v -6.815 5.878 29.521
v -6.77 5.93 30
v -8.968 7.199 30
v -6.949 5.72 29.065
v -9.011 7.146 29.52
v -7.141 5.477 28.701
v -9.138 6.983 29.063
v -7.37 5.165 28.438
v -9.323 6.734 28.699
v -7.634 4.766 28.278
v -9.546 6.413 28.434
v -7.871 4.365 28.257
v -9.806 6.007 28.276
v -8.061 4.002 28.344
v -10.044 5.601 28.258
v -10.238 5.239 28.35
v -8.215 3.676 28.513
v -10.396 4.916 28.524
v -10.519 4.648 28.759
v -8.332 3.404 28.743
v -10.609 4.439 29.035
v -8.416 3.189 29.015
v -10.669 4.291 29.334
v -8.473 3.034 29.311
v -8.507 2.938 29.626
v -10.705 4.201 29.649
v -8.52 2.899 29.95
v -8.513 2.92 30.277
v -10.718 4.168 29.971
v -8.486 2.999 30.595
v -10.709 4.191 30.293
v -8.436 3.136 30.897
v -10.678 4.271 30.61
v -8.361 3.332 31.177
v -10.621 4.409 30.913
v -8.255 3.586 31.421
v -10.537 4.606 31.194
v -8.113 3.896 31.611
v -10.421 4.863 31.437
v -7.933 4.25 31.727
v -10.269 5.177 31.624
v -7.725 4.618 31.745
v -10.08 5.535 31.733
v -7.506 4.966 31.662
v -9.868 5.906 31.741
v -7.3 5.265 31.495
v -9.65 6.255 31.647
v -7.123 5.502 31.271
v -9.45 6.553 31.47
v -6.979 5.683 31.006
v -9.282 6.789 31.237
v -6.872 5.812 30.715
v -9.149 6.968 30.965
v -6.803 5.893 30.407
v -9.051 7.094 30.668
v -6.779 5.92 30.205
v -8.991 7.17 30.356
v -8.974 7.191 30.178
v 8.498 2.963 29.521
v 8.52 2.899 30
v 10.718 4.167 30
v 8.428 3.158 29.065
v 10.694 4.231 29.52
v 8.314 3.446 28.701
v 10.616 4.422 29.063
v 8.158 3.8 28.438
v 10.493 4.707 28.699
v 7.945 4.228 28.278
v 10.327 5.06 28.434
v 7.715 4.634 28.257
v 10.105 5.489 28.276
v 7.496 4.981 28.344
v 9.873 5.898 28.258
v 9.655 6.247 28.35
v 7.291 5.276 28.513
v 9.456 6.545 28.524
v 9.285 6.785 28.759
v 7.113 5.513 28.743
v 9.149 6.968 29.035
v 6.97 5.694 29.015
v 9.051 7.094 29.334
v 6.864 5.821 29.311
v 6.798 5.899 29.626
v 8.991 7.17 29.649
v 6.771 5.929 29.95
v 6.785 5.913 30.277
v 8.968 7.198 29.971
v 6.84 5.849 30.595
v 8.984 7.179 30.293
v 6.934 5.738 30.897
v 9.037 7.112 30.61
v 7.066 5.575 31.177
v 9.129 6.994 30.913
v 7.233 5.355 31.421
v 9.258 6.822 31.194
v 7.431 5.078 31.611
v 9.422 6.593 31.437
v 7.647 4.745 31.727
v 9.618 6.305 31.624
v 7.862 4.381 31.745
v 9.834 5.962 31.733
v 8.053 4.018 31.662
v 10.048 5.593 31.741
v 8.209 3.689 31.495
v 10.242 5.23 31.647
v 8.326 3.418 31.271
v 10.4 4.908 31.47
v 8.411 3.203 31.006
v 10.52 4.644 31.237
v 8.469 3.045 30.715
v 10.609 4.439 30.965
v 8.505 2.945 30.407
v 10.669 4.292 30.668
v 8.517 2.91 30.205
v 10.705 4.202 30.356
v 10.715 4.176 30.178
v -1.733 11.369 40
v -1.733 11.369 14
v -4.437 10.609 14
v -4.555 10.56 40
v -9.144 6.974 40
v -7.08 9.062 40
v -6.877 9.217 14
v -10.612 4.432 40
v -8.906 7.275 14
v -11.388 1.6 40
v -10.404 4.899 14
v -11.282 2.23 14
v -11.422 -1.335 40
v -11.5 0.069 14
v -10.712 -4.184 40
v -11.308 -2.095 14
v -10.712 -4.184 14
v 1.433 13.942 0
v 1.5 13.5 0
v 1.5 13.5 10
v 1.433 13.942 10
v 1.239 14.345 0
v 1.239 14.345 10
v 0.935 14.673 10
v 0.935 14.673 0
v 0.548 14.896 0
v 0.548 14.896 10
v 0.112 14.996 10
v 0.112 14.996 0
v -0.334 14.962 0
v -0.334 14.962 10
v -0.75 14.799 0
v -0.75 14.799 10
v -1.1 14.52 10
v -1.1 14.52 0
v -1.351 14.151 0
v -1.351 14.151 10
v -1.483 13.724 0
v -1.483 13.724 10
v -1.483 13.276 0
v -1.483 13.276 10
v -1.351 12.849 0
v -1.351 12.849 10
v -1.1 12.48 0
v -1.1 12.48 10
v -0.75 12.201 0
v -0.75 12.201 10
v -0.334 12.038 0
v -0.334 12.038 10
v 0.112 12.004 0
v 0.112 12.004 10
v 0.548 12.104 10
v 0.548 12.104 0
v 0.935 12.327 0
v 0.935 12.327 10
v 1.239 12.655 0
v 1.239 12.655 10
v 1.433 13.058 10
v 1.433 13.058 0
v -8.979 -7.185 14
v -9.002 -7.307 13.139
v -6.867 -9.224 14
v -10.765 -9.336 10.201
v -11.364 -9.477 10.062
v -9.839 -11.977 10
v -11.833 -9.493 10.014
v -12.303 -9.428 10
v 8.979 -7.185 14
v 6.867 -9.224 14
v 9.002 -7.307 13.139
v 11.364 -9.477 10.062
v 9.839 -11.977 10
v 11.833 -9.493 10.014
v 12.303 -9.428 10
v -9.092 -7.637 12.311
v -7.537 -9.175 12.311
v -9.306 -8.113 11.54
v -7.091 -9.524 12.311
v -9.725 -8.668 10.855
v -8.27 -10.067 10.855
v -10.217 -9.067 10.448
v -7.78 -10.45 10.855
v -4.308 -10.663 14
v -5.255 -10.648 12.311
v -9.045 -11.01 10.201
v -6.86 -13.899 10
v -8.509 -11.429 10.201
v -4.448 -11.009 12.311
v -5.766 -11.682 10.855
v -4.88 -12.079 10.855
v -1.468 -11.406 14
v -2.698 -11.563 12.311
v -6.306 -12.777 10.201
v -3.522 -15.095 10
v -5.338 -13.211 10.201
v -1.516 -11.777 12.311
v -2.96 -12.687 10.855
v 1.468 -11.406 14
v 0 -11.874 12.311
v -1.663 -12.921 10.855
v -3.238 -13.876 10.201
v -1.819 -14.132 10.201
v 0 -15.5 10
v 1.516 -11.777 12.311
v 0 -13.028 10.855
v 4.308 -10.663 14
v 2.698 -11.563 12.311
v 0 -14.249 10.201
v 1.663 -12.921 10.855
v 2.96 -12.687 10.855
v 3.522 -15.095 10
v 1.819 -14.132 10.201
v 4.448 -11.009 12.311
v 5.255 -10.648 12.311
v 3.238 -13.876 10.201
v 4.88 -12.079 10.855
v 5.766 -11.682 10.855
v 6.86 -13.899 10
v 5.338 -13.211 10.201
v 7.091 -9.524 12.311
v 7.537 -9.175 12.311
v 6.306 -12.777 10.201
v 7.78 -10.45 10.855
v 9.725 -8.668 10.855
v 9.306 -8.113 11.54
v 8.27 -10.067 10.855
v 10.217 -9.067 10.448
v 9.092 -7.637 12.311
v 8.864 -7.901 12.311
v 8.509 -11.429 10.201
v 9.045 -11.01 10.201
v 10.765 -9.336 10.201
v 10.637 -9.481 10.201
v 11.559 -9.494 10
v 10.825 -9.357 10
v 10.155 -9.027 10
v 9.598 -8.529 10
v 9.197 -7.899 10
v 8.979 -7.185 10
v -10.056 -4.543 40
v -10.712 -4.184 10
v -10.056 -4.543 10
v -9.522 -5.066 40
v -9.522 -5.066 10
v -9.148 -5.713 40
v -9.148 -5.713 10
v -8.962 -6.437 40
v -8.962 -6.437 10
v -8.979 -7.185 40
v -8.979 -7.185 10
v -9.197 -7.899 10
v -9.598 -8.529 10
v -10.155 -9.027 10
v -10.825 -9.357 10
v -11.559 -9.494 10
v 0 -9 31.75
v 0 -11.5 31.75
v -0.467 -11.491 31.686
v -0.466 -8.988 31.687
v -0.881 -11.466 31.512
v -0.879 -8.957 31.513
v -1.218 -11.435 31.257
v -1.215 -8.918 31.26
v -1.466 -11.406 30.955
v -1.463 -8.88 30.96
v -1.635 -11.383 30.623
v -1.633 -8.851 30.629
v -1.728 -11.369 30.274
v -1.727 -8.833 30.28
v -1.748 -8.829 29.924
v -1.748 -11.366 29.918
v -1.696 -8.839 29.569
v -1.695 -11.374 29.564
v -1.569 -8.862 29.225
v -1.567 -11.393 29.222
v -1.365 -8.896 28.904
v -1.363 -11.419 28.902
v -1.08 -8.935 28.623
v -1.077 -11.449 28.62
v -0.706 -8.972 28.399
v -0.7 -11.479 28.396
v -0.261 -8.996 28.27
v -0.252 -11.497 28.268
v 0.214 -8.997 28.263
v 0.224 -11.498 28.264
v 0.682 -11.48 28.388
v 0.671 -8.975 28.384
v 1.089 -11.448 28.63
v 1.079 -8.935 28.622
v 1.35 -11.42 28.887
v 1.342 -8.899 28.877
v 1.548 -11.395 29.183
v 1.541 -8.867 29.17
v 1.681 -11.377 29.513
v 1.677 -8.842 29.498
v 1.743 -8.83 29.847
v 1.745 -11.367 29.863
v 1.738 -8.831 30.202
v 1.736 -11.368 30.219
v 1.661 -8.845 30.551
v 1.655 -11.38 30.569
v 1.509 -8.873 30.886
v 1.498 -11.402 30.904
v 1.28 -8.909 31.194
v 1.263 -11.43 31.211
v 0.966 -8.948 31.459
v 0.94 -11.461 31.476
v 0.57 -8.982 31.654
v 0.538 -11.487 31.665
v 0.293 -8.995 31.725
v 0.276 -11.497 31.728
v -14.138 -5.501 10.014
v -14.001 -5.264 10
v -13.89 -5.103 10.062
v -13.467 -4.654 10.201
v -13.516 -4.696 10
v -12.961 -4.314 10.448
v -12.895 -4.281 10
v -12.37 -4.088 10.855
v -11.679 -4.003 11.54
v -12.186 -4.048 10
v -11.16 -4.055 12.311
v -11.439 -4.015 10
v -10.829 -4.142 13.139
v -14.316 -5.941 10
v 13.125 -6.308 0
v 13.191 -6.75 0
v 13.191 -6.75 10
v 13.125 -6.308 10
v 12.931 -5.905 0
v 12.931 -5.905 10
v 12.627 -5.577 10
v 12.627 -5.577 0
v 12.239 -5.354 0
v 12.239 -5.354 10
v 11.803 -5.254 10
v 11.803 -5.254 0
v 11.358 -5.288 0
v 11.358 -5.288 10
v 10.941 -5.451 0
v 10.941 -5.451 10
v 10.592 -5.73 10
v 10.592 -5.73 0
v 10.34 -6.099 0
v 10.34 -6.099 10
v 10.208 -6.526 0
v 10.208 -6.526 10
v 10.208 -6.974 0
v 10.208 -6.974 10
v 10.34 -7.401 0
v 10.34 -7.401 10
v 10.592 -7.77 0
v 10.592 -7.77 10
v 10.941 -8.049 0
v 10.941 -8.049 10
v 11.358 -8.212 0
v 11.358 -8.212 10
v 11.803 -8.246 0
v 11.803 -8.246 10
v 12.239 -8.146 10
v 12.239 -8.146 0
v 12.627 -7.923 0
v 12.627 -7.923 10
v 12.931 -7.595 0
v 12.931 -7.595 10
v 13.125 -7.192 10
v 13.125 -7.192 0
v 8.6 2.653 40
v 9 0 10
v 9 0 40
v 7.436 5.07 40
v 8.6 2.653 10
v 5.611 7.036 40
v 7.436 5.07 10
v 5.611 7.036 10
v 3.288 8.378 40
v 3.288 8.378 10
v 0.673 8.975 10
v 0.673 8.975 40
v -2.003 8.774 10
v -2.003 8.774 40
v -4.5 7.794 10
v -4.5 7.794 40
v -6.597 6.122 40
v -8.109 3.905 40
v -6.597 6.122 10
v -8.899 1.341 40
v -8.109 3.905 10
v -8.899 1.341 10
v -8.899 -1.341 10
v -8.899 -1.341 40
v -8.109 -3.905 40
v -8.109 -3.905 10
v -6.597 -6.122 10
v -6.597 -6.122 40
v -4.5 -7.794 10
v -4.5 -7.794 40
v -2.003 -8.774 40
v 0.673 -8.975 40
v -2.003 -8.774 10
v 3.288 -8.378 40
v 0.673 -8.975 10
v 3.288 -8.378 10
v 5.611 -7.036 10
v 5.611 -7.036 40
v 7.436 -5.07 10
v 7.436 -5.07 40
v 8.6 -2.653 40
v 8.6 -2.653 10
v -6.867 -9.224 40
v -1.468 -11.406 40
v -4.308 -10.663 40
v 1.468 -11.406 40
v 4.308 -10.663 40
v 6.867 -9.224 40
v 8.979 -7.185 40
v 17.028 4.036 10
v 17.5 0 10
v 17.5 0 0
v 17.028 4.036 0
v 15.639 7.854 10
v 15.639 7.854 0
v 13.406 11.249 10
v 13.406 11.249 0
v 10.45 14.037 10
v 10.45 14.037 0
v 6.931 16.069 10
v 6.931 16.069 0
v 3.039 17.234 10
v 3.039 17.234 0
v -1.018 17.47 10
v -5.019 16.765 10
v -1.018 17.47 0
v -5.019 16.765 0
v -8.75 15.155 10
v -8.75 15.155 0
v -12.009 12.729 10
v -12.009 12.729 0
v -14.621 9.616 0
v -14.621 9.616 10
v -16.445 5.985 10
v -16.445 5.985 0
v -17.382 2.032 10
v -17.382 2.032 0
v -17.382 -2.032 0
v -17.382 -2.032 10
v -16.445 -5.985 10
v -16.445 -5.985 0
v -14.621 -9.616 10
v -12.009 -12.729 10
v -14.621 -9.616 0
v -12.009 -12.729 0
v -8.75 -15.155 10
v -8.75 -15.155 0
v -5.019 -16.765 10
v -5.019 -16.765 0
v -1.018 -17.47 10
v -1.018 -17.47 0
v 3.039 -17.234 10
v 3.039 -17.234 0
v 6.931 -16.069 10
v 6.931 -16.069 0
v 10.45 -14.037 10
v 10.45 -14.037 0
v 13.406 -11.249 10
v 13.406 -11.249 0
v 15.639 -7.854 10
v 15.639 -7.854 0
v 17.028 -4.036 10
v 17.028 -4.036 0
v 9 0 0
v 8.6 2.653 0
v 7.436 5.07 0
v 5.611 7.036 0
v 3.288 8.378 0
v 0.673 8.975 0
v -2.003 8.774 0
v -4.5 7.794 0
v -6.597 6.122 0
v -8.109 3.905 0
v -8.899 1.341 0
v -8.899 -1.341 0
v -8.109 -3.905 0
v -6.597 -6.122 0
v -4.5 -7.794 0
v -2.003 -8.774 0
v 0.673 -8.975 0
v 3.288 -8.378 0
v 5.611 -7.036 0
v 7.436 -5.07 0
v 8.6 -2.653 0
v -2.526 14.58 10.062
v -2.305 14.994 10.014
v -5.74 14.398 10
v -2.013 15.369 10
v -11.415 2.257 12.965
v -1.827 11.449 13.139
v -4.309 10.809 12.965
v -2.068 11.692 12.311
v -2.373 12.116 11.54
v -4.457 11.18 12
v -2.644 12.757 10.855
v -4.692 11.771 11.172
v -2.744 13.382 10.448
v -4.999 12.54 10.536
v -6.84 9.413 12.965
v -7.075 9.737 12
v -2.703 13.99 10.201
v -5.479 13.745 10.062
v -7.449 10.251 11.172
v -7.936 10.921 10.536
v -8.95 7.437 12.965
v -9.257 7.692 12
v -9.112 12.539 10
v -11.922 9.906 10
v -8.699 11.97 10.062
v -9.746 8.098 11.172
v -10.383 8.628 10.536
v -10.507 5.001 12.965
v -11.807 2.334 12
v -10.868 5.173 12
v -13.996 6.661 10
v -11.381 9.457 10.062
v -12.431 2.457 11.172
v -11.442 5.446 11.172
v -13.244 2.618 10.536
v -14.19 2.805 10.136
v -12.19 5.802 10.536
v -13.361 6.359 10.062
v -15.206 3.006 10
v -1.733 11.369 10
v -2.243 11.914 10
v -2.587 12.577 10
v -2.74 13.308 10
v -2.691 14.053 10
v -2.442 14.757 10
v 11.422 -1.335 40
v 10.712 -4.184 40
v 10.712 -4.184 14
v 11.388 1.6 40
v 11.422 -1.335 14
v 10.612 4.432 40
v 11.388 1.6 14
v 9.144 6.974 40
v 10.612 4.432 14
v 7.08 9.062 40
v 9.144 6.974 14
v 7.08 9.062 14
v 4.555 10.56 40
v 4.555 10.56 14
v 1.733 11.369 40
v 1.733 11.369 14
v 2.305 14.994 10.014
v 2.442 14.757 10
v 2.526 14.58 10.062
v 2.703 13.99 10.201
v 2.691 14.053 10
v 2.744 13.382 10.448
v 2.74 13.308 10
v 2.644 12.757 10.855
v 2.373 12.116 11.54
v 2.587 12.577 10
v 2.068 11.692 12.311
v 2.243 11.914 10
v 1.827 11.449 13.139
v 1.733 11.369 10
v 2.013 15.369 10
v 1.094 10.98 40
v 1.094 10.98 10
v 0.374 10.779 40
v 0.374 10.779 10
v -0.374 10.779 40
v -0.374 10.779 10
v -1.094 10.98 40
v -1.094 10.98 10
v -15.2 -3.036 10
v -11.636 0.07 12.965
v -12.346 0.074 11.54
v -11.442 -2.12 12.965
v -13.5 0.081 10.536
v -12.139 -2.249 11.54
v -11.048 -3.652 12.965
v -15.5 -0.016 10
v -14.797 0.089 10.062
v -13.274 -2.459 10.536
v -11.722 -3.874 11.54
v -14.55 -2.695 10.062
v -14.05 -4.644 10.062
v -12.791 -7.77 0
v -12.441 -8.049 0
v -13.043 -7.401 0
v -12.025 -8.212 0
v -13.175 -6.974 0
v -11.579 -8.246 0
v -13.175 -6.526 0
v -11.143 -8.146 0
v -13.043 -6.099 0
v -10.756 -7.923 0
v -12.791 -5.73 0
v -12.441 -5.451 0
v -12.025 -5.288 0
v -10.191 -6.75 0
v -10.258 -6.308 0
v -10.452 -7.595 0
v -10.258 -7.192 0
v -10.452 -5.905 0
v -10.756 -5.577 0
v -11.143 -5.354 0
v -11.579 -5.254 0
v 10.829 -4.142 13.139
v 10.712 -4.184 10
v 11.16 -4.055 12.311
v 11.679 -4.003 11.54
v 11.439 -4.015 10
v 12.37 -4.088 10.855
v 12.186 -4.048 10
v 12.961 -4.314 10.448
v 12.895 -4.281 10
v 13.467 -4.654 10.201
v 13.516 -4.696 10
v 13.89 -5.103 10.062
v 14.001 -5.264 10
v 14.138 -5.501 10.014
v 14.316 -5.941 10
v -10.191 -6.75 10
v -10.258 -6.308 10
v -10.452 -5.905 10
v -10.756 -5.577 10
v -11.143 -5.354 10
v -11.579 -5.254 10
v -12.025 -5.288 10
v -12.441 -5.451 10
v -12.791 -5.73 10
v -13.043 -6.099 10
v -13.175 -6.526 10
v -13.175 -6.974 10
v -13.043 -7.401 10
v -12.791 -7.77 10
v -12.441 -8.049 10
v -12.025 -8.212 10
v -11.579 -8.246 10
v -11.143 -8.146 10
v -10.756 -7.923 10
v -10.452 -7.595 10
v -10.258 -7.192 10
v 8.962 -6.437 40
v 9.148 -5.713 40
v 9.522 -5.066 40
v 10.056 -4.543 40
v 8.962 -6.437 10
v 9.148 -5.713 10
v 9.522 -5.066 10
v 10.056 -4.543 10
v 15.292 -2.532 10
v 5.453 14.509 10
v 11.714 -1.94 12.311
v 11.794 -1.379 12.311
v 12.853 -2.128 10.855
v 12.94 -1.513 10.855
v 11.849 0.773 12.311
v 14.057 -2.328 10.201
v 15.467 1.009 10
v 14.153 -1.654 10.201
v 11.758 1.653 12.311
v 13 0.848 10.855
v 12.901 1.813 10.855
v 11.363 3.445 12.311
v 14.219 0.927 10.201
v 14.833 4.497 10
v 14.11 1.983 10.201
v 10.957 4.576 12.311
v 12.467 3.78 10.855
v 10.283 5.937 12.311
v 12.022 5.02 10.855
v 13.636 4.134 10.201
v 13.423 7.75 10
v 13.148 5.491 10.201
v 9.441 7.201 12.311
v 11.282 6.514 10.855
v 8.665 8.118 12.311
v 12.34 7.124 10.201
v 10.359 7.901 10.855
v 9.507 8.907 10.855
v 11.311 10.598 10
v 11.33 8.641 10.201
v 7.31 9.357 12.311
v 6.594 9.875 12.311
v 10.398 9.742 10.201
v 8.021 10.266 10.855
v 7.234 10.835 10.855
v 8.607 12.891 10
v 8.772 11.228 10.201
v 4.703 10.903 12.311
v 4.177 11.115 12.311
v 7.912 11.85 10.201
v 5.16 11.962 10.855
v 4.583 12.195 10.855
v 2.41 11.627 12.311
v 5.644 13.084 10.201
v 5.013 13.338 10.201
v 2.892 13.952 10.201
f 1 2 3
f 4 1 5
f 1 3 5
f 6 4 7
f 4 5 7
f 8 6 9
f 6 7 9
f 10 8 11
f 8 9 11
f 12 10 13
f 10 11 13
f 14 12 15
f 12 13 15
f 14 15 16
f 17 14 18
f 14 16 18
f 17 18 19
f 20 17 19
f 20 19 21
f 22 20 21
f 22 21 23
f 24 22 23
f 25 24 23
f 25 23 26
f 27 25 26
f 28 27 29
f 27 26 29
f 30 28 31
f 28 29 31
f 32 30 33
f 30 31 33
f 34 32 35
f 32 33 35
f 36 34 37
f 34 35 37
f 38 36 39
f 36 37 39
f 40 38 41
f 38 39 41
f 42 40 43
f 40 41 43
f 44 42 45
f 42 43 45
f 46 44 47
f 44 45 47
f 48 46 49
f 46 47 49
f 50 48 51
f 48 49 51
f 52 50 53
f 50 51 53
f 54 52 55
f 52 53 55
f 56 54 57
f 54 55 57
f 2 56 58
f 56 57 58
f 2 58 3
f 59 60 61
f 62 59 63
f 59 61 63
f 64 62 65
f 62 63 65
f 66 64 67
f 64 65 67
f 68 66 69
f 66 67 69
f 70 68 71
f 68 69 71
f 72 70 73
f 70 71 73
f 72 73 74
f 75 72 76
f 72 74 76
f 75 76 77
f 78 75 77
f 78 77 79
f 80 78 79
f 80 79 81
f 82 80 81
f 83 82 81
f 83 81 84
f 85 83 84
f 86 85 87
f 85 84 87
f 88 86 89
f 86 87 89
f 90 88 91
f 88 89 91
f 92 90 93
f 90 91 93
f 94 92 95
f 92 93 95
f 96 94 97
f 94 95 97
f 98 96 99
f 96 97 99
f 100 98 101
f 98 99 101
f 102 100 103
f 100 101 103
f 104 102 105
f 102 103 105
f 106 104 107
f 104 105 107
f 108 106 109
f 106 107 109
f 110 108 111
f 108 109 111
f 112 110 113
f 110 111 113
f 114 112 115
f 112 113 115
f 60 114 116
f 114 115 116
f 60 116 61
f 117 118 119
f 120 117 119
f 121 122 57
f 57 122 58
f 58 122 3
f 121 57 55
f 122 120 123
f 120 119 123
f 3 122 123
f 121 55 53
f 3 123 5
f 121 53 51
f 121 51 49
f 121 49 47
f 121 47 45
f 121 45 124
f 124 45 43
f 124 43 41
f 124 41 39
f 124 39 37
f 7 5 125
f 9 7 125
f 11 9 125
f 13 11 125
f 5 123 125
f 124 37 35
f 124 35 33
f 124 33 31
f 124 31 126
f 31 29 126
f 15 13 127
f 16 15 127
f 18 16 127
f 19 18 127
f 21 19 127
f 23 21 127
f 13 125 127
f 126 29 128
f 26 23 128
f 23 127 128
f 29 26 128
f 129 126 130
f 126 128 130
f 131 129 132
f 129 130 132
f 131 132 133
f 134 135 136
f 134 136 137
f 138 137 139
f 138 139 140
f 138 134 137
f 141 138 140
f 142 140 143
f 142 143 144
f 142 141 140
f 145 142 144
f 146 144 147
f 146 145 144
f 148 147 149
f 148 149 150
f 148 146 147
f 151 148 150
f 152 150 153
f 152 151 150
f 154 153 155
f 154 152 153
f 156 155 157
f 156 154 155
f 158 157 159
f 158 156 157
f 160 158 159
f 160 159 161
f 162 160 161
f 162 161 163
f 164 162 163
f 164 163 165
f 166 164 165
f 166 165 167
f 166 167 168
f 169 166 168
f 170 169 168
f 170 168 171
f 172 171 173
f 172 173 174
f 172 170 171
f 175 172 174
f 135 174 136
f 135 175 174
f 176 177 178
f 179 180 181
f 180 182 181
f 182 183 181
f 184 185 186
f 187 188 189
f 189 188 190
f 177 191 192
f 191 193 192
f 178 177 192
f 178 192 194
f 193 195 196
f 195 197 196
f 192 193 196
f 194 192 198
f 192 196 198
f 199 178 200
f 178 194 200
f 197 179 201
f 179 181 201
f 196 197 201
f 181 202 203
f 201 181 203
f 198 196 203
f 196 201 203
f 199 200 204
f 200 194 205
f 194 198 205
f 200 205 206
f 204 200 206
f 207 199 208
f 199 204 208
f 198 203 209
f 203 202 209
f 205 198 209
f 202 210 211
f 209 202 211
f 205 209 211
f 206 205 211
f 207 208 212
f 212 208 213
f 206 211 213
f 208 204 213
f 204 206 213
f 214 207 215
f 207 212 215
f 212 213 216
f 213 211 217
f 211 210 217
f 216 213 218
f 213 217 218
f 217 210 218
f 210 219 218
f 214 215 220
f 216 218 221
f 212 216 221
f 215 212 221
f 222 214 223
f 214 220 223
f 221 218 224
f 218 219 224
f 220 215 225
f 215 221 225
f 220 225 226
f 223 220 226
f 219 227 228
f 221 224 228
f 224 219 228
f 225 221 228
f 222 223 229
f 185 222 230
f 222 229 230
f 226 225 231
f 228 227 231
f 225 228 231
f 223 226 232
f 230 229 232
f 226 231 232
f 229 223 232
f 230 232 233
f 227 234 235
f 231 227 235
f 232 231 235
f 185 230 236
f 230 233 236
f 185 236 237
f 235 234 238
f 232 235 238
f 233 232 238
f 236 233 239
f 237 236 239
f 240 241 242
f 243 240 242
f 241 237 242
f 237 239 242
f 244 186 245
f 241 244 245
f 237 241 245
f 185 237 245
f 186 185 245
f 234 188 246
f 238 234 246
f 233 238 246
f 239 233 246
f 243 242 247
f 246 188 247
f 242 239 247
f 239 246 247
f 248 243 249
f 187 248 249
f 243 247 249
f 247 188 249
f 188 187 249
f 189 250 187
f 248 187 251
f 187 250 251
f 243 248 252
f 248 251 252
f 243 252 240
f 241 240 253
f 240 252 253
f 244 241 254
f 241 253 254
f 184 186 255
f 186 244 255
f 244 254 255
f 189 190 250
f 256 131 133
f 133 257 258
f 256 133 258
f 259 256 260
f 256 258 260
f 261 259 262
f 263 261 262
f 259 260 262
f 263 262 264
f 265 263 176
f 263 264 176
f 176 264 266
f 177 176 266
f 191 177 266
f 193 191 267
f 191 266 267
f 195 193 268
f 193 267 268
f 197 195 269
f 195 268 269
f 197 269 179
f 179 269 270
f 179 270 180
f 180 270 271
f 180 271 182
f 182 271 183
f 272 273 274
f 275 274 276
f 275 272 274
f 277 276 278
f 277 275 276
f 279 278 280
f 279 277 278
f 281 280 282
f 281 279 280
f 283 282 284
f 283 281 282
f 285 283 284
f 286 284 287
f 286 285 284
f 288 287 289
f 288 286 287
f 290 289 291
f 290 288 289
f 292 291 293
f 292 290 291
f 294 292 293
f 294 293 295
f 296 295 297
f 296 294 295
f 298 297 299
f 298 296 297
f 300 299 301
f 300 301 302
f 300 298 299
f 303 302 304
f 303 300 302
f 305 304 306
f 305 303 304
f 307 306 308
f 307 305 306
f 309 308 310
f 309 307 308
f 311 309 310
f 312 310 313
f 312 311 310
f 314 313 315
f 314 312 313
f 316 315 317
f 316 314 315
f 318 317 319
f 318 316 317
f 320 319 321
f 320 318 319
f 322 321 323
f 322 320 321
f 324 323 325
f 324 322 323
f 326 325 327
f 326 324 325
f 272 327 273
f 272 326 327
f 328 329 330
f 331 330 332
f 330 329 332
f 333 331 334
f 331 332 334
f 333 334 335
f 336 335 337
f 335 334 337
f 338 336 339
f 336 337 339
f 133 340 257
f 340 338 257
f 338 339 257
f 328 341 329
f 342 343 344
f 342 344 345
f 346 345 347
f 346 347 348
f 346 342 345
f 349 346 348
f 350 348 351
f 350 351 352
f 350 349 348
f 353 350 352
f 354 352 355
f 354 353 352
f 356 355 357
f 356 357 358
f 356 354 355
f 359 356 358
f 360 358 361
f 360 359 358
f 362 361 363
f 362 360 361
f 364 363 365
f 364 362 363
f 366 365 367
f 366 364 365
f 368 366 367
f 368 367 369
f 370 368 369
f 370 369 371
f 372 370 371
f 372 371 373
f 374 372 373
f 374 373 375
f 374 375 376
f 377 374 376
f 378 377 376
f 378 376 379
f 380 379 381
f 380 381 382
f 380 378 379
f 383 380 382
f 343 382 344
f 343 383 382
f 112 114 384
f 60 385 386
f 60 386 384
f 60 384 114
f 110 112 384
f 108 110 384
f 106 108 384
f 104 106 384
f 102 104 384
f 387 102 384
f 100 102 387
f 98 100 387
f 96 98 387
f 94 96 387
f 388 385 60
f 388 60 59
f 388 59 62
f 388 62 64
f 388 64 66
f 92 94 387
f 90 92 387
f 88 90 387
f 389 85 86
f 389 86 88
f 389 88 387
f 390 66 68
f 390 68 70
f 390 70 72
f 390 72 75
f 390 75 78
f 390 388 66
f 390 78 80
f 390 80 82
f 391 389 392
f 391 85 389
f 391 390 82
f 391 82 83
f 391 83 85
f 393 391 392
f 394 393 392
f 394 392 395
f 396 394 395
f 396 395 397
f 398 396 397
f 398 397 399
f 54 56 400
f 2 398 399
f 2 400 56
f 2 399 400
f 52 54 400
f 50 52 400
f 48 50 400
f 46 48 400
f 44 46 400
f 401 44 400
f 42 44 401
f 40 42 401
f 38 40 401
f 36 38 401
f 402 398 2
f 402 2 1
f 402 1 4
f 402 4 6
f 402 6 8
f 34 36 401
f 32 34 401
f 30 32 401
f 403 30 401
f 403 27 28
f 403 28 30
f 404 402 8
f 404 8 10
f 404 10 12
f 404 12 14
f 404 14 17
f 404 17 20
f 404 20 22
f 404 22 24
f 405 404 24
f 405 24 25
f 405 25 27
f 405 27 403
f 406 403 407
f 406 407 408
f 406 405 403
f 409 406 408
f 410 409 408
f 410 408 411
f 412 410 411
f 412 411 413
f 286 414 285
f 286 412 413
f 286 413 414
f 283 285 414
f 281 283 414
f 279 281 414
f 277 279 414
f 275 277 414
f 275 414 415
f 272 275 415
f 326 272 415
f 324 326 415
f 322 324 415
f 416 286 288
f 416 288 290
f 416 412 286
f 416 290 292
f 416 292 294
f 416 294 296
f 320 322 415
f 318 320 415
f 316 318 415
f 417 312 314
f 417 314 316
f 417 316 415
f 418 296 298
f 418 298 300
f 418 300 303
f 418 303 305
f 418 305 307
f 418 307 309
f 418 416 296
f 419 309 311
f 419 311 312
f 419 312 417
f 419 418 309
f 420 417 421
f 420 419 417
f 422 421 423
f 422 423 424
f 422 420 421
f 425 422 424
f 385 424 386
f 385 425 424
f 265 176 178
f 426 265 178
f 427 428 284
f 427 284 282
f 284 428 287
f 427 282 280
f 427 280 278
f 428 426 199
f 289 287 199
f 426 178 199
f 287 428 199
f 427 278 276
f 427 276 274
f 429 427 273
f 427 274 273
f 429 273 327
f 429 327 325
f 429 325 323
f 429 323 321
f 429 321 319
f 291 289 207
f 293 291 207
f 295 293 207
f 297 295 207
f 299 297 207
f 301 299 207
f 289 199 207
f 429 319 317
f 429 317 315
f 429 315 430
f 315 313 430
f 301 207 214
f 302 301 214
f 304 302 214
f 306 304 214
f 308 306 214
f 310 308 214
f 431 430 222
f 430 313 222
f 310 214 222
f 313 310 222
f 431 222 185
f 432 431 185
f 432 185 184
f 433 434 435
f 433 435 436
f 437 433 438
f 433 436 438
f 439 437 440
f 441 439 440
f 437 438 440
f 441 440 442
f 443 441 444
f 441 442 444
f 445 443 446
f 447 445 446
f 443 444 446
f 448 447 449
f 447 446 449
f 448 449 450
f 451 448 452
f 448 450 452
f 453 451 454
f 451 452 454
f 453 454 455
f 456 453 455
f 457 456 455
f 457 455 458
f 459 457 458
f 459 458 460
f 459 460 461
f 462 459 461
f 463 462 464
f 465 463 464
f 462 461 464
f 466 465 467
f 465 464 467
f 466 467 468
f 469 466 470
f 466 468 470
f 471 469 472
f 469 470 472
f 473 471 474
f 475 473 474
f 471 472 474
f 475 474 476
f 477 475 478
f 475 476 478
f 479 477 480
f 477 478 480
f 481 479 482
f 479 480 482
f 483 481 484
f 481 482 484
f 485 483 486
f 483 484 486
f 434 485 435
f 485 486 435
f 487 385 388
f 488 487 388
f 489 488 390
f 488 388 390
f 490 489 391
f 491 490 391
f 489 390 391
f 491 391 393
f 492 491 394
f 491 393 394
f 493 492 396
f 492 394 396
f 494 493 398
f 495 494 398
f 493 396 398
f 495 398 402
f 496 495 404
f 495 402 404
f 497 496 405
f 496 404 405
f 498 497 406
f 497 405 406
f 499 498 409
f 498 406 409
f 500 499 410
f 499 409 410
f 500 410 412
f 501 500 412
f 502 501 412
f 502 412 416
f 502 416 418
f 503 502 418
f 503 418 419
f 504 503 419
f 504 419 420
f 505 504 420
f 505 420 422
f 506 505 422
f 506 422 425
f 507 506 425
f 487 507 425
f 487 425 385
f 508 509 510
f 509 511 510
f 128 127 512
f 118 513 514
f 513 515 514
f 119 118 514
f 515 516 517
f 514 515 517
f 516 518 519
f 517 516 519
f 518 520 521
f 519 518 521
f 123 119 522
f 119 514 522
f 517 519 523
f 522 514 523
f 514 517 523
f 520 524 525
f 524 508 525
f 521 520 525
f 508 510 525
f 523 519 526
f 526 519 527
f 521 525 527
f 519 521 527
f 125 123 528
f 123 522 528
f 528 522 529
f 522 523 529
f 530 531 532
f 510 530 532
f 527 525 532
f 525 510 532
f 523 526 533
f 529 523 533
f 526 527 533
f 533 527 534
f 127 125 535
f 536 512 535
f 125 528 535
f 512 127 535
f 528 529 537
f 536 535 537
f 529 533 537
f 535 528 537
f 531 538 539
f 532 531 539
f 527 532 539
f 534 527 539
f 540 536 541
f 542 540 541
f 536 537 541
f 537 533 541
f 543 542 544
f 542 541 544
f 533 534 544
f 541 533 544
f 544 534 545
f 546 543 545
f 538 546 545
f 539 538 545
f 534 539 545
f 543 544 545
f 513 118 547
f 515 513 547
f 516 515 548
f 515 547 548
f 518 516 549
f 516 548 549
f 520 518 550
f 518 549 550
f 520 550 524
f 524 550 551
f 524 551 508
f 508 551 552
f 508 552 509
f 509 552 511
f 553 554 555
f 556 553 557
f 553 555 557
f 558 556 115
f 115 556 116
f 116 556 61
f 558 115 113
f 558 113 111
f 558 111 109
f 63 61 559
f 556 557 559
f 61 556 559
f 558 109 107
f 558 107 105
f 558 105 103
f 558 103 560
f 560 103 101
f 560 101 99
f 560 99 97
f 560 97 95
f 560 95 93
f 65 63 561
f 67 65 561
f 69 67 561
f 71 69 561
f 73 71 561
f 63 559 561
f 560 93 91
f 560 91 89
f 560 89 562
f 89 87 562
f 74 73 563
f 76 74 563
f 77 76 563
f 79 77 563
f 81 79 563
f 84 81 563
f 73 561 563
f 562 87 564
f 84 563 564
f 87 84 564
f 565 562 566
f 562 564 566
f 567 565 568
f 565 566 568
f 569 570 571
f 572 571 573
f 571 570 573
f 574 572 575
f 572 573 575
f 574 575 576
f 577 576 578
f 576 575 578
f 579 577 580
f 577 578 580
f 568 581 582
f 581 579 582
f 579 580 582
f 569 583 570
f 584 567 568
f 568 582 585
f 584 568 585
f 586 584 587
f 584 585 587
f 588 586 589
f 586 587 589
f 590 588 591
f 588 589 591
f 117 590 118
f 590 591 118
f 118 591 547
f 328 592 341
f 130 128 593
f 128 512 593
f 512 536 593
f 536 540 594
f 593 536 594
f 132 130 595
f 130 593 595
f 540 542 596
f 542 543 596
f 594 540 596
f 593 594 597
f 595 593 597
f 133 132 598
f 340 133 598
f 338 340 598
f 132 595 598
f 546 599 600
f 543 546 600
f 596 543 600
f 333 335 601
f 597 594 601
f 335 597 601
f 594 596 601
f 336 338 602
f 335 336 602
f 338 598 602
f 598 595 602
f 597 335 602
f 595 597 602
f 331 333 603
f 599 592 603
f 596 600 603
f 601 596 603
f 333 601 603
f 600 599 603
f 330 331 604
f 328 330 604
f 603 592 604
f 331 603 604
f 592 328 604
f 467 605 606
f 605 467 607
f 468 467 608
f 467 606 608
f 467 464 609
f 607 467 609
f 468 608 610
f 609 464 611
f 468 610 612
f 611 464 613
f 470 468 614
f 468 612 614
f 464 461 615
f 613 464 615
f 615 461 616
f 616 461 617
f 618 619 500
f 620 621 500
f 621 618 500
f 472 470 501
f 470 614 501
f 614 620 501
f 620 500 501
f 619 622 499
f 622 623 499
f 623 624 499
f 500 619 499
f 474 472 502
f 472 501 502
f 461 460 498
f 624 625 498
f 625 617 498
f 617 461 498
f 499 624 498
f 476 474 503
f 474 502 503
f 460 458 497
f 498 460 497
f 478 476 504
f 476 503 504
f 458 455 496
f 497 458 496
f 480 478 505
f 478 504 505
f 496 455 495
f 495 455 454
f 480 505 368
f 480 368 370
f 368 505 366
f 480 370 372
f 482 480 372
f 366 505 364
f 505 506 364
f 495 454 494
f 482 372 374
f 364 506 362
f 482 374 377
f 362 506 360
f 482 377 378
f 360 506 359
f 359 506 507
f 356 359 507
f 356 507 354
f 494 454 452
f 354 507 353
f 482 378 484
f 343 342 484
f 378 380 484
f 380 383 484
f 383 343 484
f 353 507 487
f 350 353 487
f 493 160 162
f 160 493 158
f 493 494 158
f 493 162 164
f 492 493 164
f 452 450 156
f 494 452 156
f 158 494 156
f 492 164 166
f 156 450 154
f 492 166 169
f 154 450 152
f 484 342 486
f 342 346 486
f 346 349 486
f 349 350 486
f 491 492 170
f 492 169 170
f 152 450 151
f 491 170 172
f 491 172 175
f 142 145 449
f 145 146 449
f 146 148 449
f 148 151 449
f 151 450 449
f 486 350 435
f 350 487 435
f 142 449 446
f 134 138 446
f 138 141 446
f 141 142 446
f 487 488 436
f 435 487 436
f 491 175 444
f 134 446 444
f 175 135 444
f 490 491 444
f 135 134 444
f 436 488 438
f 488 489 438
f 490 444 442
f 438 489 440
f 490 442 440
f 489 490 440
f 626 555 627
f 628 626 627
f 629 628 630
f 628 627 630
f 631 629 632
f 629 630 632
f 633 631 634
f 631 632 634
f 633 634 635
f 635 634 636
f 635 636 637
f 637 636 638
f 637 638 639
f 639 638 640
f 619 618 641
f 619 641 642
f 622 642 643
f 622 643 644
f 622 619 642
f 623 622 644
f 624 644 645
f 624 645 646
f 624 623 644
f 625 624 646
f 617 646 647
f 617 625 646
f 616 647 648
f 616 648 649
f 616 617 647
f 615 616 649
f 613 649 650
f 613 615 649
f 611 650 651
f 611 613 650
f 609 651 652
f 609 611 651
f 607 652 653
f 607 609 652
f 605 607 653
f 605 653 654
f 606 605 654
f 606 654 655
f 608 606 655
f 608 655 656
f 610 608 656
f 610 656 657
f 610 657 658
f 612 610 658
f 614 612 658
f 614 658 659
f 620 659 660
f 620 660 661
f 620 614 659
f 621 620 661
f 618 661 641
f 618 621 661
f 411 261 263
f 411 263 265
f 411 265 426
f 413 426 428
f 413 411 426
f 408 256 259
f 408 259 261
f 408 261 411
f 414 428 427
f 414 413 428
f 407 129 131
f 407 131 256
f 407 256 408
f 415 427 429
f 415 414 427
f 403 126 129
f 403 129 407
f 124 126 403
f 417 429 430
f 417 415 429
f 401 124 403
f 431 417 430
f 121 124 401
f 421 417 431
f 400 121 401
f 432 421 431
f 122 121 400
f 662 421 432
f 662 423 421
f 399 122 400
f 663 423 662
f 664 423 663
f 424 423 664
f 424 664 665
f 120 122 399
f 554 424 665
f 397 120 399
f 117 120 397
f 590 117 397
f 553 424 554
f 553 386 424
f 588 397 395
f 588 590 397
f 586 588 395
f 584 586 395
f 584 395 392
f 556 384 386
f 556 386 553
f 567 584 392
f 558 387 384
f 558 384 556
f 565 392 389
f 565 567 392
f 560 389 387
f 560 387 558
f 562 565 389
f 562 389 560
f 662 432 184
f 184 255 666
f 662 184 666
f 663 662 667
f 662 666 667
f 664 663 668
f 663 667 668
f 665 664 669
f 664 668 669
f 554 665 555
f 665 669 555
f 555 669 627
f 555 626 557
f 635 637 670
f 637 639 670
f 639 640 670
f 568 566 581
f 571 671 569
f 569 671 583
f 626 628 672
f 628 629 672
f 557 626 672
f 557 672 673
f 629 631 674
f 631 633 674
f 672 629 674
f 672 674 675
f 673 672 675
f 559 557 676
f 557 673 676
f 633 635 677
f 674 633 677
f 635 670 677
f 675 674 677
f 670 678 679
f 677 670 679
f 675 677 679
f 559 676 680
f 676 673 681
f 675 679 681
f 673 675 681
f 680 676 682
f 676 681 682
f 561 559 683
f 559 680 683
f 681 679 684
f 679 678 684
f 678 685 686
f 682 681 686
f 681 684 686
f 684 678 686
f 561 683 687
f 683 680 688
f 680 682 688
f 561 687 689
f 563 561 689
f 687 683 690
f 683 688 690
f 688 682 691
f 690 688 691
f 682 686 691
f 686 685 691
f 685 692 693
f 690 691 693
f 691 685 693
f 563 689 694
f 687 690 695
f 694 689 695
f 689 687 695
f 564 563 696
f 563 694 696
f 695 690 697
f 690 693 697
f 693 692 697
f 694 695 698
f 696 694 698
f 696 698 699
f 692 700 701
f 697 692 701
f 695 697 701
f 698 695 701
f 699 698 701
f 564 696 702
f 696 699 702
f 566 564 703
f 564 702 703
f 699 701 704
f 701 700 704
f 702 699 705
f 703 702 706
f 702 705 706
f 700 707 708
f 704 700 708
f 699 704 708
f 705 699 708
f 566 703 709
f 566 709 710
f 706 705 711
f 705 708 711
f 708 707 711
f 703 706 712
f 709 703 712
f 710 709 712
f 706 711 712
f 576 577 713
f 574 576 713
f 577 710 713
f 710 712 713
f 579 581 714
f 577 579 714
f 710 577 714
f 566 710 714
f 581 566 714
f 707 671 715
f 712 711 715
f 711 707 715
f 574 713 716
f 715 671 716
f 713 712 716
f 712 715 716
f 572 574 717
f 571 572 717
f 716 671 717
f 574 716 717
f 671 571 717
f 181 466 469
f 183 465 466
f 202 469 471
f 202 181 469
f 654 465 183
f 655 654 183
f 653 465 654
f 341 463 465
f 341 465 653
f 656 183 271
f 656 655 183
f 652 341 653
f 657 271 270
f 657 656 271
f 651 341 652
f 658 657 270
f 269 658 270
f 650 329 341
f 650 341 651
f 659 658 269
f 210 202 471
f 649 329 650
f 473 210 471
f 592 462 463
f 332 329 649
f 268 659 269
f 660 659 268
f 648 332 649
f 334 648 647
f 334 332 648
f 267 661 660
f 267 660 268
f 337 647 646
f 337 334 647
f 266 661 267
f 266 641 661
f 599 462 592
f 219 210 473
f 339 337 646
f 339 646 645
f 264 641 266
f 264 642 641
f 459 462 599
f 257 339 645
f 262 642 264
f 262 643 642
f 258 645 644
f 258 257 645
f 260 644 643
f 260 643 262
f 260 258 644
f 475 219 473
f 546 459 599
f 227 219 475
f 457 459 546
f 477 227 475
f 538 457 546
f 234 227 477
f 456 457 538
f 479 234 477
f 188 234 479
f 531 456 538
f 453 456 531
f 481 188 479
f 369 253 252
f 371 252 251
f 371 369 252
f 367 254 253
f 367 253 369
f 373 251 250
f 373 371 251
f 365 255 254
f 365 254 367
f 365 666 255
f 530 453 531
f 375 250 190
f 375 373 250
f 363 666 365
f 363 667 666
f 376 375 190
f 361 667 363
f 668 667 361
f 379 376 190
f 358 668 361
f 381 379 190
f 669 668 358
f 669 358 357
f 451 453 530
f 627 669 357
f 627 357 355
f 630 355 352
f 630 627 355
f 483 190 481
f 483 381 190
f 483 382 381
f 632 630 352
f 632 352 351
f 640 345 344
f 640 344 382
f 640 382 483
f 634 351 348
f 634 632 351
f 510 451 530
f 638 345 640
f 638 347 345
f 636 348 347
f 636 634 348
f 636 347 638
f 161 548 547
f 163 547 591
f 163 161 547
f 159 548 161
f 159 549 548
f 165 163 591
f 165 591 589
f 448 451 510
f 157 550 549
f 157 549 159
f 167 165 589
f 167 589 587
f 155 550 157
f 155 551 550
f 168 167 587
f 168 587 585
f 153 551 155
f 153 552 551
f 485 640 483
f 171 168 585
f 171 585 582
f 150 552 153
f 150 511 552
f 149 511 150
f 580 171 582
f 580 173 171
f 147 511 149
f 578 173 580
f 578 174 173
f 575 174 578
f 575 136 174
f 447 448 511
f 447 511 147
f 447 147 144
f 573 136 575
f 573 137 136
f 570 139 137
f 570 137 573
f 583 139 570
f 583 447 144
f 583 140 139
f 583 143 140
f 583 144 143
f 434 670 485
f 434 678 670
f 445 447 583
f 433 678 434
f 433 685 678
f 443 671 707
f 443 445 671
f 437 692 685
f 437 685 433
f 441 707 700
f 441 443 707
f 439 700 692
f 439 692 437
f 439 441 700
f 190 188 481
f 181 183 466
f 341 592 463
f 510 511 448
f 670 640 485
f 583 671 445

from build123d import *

# Parameters (mm, degrees)
SKETCH1_R           = 17.5
SKETCH1_R_2         = 1.5
BOSS_EXTRUDE1_DEPTH = 10
SKETCH2_R           = 9
BOSS_EXTRUDE2_DEPTH = 30
SKETCH2_2_R         = 9
CUT_EXTRUDE1_DEPTH  = 39.890872965
FILLET1_R           = 4
SKETCH4_4_W         = 1.75
SKETCH4_4_H         = 11.757944022


with BuildPart() as part:
    # Sketch1 → Boss-Extrude1 (new body)
    with BuildSketch(Plane.XY):
        Circle(SKETCH1_R)
        with Locations((0, 13.5)):
            Circle(SKETCH1_R_2, mode=Mode.SUBTRACT)
        with Locations((11.691342951, -6.75)):
            Circle(SKETCH1_R_2, mode=Mode.SUBTRACT)
        with Locations((-11.691342951, -6.75)):
            Circle(SKETCH1_R_2, mode=Mode.SUBTRACT)
    extrude(amount=BOSS_EXTRUDE1_DEPTH)

    # Sketch2 → Boss-Extrude2 (add)
    with BuildSketch(Plane.XY.offset(10)):
        with BuildLine():
            ThreePointArc((10.71198615, -4.18370084), (9.959292144, 5.75), (1.732801866, 11.368702551))
            ThreePointArc((1.732801866, 11.368702551), (0, 10.753177996), (-1.732801866, 11.368702551))
            ThreePointArc((-1.732801866, 11.368702551), (-9.959292144, 5.75), (-10.71198615, -4.18370084))
            ThreePointArc((-10.71198615, -4.18370084), (-9.312525316, -5.376588998), (-8.979184285, -7.185001711))
            ThreePointArc((-8.979184285, -7.185001711), (0, -11.5), (8.979184285, -7.185001711))
            ThreePointArc((8.979184285, -7.185001711), (9.312525316, -5.376588998), (10.71198615, -4.18370084))
        make_face()
        Circle(SKETCH2_R, mode=Mode.SUBTRACT)
    extrude(amount=BOSS_EXTRUDE2_DEPTH)

    # Sketch2<2> → Cut-Extrude1 (cut, through all)
    with BuildSketch(Plane.XY.offset(10)):
        Circle(SKETCH2_2_R)
    extrude(amount=-CUT_EXTRUDE1_DEPTH, mode=Mode.SUBTRACT)

    # Fillet1
    # the kernel refuses this fillet: 4 mm, written as the material it adds along each edge
    with BuildSketch(Plane(origin=(0, 0, 10), x_dir=(-0.9810153845306142, 0.19392992372053186, 0), z_dir=(0.19392992372053186, 0.9810153845306142, 0))) as fillet1_piece_1_section:
        with BuildLine():
            CenterArc((11.5 + FILLET1_R, FILLET1_R), FILLET1_R, 180, 90)
            Line((11.5, FILLET1_R), (11.5, 0))
            Line((11.5, 0), (11.5 + FILLET1_R, 0))
        make_face()
    fillet1_piece_1 = revolve(axis=Axis((0, 0, 10), (0, 0, 1)), revolution_arc=202.364438996, mode=Mode.PRIVATE)
    fillet1_piece_1 = fillet1_piece_1 - Plane(origin=(11.691342951, -6.75, 10.886663102), x_dir=(-0.9873805666072768, -0.15836545294442564, 0), z_dir=(0, 0, -1)) * Cylinder(2.746822004, 62, mode=Mode.PRIVATE)
    fillet1_piece_1 = fillet1_piece_1 - Plane(origin=(-11.691342951, -6.75, 10.886663102), x_dir=(0.3565417779714824, 0.9342793803573609, 0), z_dir=(0, 0, -1)) * Cylinder(2.746822004, 62, mode=Mode.PRIVATE)
    add(fillet1_piece_1)
    with BuildSketch(Plane(origin=(0, 0, 10), x_dir=(0.3225594517692616, -0.9465492063671669, 0), z_dir=(-0.9465492063671669, -0.3225594517692616, 0))) as fillet1_piece_2_section:
        with BuildLine():
            CenterArc((11.5 + FILLET1_R, FILLET1_R), FILLET1_R, 180, 90)
            Line((11.5, FILLET1_R), (11.5, 0))
            Line((11.5, 0), (11.5 + FILLET1_R, 0))
        make_face()
    fillet1_piece_2 = revolve(axis=Axis((0, 0, 10), (0, 0, 1)), revolution_arc=202.364438996, mode=Mode.PRIVATE)
    fillet1_piece_2 = fillet1_piece_2 - Plane(origin=(11.691342951, -6.75, 10.886663102), x_dir=(-0.9873805666072768, -0.15836545294442564, 0), z_dir=(0, 0, -1)) * Cylinder(2.746822004, 62, mode=Mode.PRIVATE)
    fillet1_piece_2 = fillet1_piece_2 - Plane(origin=(0, 13.5, 10.886663102), x_dir=(0.6308387886354789, -0.7759139274126491, 0), z_dir=(0, 0, -1)) * Cylinder(2.746822004, 62, mode=Mode.PRIVATE)
    add(fillet1_piece_2)
    with BuildSketch(Plane(origin=(0, 0, 10), x_dir=(0.6584559327613483, 0.7526192826465335, 0), z_dir=(0.7526192826465335, -0.6584559327613483, 0))) as fillet1_piece_3_section:
        with BuildLine():
            CenterArc((11.5 + FILLET1_R, FILLET1_R), FILLET1_R, 180, 90)
            Line((11.5, FILLET1_R), (11.5, 0))
            Line((11.5, 0), (11.5 + FILLET1_R, 0))
        make_face()
    fillet1_piece_3 = revolve(axis=Axis((0, 0, 10), (0, 0, 1)), revolution_arc=202.364438996, mode=Mode.PRIVATE)
    fillet1_piece_3 = fillet1_piece_3 - Plane(origin=(0, 13.5, 10.886663102), x_dir=(0.6308387886354789, -0.7759139274126491, 0), z_dir=(0, 0, -1)) * Cylinder(2.746822004, 63, mode=Mode.PRIVATE)
    fillet1_piece_3 = fillet1_piece_3 - Plane(origin=(-11.691342951, -6.75, 10.886663102), x_dir=(0.3565417779714824, 0.9342793803573609, 0), z_dir=(0, 0, -1)) * Cylinder(2.746822004, 63, mode=Mode.PRIVATE)
    add(fillet1_piece_3)

    # Sketch4 → Cut-Revolve1 (revolve, cut)
    with BuildSketch(Plane.XY.offset(30), mode=Mode.PRIVATE) as cut_revolve1_sk:
        Polygon((-16.858526531, 9.733274831), (-6.675848312, 3.85430282), (-7.550848312, 2.338758363), (-17.733526531, 8.217730374), align=None)
    revolve(cut_revolve1_sk.sketch.rotate(Axis((0, 0, 30), (-0.8660254037844364, 0.5000000000000039, 0)), 180), axis=Axis((0, 0, 30), (-0.8660254037844364, 0.5000000000000039, 0)), mode=Mode.SUBTRACT)

    # Sketch4<3> → Cut-Revolve2 (revolve, cut)
    with BuildSketch(Plane.XY.offset(30), mode=Mode.PRIVATE) as cut_revolve2_sk:
        Polygon((15.983526531, 11.248819288), (16.858526531, 9.733274831), (6.675848312, 3.85430282), (5.800848312, 5.369847276), align=None)
    revolve(cut_revolve2_sk.sketch.rotate(Axis((0, 0, 30), (0.8660254037844362, 0.5000000000000044, 0)), 180), axis=Axis((0, 0, 30), (0.8660254037844362, 0.5000000000000044, 0)), mode=Mode.SUBTRACT)

    # Sketch4<4> → Cut-Revolve3 (revolve, cut)
    with BuildSketch(Plane.XY.offset(30), mode=Mode.PRIVATE) as cut_revolve3_sk:
        with Locations((0.875, -13.587577651)):
            Rectangle(SKETCH4_4_W, SKETCH4_4_H)
    revolve(cut_revolve3_sk.sketch.rotate(Axis((0, 0, 30), (0, -1, 0)), 90), axis=Axis((0, 0, 30), (0, -1, 0)), mode=Mode.SUBTRACT)


solid = part.part
